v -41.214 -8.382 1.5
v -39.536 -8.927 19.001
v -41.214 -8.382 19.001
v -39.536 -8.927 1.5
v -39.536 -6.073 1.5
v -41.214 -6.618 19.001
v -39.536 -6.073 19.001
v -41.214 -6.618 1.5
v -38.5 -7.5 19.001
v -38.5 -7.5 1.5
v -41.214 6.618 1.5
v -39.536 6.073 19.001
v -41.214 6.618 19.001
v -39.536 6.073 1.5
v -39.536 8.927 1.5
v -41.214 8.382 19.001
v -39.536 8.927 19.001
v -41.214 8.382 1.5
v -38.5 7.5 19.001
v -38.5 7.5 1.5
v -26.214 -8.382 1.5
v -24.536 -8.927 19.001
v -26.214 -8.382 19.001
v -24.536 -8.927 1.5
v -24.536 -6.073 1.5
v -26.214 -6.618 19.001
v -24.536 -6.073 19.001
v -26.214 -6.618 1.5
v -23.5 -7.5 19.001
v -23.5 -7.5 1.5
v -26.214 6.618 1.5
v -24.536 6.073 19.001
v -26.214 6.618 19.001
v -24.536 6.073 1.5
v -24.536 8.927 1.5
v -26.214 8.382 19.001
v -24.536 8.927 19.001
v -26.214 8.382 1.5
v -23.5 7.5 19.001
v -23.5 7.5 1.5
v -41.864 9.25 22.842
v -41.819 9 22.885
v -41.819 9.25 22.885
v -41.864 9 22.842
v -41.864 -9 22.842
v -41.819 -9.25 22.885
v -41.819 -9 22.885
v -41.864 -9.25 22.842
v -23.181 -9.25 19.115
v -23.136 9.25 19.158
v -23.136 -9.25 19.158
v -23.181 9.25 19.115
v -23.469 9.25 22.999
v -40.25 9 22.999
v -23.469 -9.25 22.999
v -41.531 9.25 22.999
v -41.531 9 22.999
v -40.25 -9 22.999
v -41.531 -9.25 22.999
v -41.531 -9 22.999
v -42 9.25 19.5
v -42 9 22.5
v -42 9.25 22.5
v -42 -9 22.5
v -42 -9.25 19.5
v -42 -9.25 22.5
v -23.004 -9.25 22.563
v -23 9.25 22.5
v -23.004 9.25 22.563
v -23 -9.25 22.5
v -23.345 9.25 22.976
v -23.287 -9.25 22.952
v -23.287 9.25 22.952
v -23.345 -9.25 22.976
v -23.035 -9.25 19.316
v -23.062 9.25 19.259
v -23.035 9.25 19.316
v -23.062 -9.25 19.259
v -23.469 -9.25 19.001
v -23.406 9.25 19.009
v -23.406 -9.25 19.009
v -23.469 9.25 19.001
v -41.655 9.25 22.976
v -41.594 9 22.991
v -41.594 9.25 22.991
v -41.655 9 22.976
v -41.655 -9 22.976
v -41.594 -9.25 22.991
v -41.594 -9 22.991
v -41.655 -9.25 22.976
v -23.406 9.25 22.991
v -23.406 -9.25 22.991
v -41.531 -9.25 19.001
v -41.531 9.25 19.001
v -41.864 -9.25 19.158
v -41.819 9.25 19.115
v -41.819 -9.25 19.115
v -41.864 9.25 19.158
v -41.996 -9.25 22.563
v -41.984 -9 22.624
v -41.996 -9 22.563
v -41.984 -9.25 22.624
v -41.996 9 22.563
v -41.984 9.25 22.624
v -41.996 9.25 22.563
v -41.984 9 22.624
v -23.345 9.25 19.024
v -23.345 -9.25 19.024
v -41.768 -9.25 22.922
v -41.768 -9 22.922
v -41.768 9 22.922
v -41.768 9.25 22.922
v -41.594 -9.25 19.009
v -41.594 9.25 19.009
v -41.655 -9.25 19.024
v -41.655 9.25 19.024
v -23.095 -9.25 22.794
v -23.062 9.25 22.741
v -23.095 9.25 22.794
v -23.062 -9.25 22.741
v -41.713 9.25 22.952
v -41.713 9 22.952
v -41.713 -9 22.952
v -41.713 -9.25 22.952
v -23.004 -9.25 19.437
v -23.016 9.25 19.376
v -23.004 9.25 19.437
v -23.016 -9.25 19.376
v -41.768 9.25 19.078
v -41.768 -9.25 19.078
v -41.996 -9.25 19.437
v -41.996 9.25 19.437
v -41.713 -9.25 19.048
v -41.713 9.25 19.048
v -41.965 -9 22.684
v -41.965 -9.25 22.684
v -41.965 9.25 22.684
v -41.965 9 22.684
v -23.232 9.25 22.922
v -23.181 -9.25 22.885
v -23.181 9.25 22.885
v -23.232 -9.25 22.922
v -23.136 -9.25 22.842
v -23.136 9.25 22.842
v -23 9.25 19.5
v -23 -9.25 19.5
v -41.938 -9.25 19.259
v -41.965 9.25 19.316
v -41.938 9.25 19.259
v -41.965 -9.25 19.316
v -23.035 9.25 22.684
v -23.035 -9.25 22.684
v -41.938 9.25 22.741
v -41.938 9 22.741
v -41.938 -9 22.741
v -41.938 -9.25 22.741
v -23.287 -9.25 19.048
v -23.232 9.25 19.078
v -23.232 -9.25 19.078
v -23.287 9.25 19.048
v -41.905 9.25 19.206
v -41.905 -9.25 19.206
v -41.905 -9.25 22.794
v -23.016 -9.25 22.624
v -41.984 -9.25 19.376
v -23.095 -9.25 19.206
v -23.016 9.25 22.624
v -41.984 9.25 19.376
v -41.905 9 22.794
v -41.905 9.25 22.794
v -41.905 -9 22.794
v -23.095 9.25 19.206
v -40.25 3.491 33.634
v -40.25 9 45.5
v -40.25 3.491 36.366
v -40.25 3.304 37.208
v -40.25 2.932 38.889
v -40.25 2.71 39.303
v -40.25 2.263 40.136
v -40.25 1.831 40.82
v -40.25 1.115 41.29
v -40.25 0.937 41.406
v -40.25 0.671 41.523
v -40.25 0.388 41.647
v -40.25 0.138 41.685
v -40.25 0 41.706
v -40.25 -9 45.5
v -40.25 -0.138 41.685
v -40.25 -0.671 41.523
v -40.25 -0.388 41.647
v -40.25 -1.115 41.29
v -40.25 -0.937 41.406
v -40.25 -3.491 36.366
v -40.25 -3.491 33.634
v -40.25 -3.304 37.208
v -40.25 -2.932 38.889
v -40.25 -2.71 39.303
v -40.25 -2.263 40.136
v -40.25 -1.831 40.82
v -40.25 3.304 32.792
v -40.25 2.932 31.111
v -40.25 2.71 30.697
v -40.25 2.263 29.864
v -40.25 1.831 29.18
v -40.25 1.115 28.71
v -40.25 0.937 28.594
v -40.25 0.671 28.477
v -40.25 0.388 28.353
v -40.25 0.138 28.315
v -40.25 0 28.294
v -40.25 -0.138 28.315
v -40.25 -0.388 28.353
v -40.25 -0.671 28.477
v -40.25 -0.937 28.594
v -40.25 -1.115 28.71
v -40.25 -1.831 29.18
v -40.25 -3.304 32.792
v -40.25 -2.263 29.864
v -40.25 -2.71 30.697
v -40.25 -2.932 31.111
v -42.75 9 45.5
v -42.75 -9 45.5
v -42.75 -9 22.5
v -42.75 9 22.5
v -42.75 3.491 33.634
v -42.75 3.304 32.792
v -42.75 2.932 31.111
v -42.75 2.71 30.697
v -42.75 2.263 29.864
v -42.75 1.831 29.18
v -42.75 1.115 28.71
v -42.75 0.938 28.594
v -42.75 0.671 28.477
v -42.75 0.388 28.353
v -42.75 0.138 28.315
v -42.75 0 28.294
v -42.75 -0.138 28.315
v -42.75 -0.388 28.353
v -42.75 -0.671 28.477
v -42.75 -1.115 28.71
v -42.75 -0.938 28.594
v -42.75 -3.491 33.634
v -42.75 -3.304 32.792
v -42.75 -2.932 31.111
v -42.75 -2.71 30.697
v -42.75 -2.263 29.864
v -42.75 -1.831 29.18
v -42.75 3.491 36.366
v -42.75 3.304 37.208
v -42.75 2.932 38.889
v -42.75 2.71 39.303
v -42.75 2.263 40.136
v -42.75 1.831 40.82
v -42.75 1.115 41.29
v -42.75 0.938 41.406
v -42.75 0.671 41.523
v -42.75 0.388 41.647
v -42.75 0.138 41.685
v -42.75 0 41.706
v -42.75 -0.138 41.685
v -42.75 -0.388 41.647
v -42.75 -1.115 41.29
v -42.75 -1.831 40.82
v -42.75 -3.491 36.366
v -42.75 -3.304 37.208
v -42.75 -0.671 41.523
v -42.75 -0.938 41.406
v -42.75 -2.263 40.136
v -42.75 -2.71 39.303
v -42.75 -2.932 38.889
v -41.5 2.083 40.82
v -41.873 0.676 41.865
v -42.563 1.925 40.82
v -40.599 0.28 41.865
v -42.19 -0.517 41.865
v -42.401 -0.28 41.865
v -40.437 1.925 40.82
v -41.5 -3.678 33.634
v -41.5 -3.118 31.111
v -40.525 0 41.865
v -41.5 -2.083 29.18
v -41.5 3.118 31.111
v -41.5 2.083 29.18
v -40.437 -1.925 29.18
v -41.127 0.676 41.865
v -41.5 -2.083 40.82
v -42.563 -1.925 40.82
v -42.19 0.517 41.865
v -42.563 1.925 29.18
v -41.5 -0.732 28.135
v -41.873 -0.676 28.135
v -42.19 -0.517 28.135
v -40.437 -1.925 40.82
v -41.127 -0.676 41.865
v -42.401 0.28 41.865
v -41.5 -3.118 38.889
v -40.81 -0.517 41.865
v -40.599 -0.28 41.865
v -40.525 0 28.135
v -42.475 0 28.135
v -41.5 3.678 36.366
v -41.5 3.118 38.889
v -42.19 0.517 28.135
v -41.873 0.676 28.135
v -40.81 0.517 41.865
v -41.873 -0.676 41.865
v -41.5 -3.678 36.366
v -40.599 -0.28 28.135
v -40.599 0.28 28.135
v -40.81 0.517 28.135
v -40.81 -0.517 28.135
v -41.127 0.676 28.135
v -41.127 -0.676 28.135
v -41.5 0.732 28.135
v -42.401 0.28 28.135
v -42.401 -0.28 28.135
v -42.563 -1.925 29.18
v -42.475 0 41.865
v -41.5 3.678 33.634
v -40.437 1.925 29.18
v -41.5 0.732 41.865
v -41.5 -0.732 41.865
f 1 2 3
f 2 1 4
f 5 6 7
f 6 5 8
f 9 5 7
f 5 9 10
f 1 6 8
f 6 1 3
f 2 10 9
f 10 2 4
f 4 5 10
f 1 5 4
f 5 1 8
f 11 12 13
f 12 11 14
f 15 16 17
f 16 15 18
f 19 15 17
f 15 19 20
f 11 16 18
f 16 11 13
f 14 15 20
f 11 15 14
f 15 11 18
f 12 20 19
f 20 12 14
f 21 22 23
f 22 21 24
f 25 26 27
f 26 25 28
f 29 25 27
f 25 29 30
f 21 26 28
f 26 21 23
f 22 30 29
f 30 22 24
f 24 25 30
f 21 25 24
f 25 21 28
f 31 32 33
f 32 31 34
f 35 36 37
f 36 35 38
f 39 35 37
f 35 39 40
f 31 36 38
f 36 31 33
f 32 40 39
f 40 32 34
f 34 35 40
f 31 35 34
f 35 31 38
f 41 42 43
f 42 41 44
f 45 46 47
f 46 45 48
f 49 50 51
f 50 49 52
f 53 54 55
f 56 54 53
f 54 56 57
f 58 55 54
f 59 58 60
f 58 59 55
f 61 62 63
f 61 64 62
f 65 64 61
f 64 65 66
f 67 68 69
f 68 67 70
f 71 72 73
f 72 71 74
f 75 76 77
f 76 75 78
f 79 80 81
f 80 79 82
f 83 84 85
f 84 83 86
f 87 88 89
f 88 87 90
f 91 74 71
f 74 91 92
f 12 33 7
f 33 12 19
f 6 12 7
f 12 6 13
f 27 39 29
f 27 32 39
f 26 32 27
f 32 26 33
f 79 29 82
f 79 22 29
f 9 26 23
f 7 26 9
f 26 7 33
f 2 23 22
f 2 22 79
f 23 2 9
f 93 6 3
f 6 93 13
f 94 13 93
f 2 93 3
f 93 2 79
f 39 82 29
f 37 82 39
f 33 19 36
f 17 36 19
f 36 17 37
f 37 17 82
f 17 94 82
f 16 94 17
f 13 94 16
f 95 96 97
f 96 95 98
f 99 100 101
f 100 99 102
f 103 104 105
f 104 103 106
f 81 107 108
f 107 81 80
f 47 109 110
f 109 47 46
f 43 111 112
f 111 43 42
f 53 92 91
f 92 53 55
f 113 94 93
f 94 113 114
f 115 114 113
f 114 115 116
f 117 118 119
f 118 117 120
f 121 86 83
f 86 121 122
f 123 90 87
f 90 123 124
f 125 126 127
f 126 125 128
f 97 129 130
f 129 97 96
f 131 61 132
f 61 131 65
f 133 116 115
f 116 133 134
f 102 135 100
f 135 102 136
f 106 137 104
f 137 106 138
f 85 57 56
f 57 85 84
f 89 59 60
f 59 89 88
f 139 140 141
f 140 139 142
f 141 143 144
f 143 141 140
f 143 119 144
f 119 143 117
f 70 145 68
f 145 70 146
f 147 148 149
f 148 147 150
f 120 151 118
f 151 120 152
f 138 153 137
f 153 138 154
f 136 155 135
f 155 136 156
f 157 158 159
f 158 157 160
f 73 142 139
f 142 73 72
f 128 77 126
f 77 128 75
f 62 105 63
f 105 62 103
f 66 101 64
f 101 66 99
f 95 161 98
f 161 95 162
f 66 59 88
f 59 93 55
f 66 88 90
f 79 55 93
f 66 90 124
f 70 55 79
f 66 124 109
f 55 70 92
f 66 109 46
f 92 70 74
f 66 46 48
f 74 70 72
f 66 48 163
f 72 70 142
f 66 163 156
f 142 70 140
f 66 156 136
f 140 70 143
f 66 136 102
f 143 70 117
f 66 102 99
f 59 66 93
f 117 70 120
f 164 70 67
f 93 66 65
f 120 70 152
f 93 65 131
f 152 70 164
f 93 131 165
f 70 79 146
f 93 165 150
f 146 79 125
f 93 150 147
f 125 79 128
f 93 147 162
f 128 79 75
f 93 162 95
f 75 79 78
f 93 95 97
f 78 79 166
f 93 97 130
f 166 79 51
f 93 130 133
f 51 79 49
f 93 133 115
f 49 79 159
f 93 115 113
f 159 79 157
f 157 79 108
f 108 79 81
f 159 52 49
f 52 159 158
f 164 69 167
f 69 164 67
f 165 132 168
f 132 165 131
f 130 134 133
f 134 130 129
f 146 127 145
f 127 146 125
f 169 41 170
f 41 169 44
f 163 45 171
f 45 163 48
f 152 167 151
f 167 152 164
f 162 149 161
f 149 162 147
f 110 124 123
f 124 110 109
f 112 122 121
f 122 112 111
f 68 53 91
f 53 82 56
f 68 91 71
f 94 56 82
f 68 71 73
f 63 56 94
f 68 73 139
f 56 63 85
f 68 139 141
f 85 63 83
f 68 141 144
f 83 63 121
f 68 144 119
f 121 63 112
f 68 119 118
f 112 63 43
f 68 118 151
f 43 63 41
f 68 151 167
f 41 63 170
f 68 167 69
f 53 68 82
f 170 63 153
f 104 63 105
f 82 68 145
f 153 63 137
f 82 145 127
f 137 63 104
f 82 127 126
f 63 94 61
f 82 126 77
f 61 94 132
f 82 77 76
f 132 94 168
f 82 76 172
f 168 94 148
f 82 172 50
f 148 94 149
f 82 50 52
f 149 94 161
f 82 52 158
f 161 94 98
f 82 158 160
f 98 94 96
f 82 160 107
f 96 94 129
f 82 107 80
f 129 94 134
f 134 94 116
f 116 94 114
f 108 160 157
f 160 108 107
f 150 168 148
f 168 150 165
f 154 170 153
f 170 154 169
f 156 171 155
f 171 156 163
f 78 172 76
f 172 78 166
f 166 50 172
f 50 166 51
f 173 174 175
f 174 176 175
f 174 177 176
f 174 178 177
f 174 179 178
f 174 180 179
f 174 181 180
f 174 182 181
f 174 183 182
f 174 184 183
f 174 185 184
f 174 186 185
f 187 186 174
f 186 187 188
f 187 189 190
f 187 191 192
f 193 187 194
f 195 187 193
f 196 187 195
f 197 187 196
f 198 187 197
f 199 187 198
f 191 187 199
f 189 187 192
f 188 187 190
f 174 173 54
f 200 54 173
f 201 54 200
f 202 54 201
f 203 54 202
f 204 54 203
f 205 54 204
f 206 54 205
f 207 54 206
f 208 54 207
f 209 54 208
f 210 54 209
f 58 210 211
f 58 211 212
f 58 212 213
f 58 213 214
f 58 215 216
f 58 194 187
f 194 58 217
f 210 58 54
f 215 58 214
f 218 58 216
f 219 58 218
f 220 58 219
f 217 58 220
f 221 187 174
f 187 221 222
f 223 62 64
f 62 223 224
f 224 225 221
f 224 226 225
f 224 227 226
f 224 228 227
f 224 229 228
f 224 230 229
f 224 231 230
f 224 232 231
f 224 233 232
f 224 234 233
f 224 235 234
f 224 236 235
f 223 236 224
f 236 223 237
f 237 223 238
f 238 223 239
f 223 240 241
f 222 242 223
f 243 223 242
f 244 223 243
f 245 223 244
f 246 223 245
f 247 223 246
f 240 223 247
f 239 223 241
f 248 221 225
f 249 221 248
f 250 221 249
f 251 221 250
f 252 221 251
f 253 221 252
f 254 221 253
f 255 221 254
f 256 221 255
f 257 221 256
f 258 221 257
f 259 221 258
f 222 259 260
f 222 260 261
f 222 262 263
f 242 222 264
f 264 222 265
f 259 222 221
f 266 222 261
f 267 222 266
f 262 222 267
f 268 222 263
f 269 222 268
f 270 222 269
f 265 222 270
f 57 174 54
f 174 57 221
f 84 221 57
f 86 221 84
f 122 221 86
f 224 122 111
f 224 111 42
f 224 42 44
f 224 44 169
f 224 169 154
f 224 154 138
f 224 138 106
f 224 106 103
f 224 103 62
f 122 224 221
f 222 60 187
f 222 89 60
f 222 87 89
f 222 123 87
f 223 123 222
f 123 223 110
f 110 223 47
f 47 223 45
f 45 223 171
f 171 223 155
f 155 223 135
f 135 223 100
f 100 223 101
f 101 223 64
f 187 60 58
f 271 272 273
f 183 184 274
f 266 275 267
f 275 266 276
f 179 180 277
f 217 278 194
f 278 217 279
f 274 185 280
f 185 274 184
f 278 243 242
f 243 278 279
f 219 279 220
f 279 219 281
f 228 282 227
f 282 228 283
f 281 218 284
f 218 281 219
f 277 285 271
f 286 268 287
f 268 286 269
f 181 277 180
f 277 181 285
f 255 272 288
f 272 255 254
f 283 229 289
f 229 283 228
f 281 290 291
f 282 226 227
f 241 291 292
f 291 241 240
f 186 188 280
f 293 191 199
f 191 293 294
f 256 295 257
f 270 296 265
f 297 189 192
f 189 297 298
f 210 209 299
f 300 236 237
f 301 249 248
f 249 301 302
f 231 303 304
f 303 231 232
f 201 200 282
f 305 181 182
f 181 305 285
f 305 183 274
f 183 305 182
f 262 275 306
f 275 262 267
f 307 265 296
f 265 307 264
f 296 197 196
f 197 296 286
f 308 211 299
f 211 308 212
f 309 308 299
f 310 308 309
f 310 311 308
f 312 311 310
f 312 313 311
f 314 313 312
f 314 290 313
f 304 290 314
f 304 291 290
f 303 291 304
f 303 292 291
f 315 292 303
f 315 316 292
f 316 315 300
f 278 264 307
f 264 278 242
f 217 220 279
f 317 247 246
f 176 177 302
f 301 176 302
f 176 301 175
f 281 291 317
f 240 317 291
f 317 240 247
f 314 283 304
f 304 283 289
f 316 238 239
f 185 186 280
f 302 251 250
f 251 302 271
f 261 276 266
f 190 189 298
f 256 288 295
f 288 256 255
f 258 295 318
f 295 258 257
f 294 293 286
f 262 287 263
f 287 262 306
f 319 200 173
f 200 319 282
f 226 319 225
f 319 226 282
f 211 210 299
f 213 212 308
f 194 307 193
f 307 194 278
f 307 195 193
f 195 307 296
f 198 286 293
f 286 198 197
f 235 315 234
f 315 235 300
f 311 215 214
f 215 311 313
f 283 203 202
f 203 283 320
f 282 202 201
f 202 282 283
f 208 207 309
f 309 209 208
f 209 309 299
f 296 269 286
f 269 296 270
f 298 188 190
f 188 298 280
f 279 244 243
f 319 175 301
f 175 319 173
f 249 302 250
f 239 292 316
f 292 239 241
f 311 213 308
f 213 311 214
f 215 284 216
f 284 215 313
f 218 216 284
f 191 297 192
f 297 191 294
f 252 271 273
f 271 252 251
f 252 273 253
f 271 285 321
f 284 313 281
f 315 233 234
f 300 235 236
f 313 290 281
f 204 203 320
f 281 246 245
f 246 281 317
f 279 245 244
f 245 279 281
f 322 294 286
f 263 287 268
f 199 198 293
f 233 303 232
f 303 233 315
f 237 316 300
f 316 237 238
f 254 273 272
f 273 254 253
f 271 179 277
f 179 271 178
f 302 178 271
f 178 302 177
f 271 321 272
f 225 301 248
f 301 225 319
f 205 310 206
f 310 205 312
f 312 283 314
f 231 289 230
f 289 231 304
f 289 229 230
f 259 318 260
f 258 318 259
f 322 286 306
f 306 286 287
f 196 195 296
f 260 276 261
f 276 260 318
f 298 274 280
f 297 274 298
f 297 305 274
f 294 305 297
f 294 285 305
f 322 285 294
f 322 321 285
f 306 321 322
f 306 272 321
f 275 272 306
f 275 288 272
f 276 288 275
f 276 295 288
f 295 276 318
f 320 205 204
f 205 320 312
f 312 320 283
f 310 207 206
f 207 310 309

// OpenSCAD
module piso()
{
    cube([100,100,3], center=true);
}

module mesa()
{
    //30 pulgadas es el tamano normal de un mesa
    //primer pierna
    translate([-20,-20,1.5])cylinder(h=30,r=1.5);
    //segunda pierna
    translate([-20,20,1.5])cylinder(h=30,r=1.5);
    //tercera pierna
    translate([20,-20,1.5])cylinder(h=30,r=1.5);
    //cuarta pierna
    translate([20,20,1.5])cylinder(h=30,r=1.5);
    
    //tapa de la mesa
    //altura mitad piso(z) + mitad mesa(z) + altura pata
    translate([0,0,33])cube([45,45,3],center=true);
}

module sillaBase()
{
    translate([-40,-7.5,1.5])cylinder(h=18,r=1.5);
    
    translate([-40,7.5,1.5])cylinder(h=18,r=1.5);
    
    translate([-25,-7.5,1.5])cylinder(h=18,r=1.5);
    
    translate([-25,7.5,1.5])cylinder(h=18,r=1.5);
    
    //altura mitad piso(z) + mitad mesa(z) + altura pata
    minkowski()
    {
    translate([-32.5,0,21])cube([18,18,3],center=true);
    rotate([90,0,0])cylinder(h=0.5,r=0.5,center = true, $fn=50);    
    }
    
}

module espaldar()
{
    difference(){
    translate([-41.5,0,34])cube([2.5,18,23],center=true);
    translate([-41.5,0,35])scale([1,.75,1.4])sphere(5);     
    }
}

module silla()
{
        sillaBase();
        espaldar();
}

silla();
